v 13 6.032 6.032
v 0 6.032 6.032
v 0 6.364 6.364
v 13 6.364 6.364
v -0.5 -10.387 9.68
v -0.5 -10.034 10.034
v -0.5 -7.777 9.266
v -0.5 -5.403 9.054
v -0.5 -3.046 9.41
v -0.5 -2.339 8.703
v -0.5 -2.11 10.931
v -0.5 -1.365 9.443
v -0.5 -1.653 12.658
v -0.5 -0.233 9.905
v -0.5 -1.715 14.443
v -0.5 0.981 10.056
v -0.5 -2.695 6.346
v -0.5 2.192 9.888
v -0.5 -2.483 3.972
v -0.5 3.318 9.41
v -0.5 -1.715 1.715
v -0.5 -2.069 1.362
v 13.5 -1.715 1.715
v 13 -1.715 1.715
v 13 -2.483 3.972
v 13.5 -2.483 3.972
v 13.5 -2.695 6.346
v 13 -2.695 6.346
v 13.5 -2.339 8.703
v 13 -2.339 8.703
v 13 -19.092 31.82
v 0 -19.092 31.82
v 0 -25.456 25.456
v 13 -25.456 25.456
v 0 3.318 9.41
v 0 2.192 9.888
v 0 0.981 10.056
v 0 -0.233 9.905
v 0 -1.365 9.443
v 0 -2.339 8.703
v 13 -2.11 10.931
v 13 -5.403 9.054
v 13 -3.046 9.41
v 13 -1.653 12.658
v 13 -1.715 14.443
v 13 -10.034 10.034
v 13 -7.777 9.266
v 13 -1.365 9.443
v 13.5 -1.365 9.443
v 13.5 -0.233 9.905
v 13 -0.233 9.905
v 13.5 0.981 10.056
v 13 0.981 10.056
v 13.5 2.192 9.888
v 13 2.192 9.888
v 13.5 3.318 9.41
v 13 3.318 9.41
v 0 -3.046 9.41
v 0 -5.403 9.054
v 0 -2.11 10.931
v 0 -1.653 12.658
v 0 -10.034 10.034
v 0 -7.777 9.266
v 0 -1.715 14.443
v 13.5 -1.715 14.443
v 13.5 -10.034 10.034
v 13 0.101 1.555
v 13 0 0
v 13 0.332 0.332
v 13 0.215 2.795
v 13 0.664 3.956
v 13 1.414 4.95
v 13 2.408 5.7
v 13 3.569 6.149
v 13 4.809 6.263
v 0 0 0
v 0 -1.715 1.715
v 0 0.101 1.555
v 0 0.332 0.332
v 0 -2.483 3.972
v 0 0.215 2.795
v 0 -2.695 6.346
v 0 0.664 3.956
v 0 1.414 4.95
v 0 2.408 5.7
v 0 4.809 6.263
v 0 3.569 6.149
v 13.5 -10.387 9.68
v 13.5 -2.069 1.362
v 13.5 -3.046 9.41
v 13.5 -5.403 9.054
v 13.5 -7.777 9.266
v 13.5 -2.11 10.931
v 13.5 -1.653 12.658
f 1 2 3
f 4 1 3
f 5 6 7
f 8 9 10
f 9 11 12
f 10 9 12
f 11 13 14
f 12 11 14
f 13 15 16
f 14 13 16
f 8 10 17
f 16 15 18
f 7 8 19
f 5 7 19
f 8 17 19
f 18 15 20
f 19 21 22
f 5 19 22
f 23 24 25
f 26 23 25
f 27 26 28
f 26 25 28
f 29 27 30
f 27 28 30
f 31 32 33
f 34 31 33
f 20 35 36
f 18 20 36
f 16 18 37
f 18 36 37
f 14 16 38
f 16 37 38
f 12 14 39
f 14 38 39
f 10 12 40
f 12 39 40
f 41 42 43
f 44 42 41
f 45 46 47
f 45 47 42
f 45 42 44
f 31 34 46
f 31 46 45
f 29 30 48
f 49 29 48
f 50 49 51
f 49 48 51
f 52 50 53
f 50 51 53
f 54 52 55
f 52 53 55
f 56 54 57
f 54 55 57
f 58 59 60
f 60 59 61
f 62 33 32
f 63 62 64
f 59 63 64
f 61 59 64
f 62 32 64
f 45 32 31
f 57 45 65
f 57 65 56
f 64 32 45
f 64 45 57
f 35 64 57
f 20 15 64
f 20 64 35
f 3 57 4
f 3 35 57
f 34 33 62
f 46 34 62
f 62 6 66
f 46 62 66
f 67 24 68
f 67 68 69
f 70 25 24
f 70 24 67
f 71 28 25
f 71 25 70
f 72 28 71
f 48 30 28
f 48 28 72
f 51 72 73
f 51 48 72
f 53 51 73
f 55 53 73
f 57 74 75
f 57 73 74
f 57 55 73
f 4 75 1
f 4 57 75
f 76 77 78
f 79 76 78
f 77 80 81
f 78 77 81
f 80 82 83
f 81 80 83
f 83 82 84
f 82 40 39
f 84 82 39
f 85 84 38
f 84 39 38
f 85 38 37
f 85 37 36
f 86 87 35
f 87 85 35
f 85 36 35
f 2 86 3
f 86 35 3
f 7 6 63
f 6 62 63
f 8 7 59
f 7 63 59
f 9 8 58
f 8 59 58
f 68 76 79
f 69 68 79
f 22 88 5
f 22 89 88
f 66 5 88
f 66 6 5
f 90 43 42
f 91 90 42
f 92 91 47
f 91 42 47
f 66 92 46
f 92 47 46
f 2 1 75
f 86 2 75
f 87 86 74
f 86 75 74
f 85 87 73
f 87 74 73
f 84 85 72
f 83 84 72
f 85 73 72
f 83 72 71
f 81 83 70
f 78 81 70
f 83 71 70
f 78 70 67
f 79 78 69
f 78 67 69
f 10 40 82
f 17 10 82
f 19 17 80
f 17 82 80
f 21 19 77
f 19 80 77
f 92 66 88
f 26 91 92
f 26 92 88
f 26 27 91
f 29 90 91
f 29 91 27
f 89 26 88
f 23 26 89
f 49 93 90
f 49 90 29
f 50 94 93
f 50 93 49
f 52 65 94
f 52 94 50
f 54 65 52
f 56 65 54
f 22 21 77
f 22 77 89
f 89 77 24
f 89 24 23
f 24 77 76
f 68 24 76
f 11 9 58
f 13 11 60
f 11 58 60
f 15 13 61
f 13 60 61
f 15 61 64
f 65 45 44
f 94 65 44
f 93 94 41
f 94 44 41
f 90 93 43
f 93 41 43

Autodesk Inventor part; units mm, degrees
ref_plane "YZ Plane" through (0, 0, 0) normal (1, 0, 0) x (0, 1, 0)
ref_plane "XZ Plane" through (0, 0, 0) normal (0, 1, 0) x (-1, 0, 0)
ref_plane "XY Plane" through (0, 0, 0) normal (0, 0, 1) x (1, 0, 0)
sketch "Sketch1" plane through (0, 0, 0) normal (1, 0, 0) x (0, 1, 0)
  line L0 (0, 0) -> (6.364, 6.364)
  line L1 (0, 0) -> (10.533, 0) construction
  line L2 (0, 0) -> (36, 0) construction
  line L3 (-19.0919, 31.8198) -> (-25.4558, 25.4558)
  line L4 (-19.0919, 31.8198) -> (6.364, 6.364)
  line L5 (-25.4558, 25.4558) -> (0, 0)
  dimension "d0" = 9
  dimension "d1" = 45
  dimension "d2" = 36
  dimension "d15" = 9
extrude "Extrusion4" add sketch "Sketch1" along normal blind 13
sketch "Sketch4" plane through (13, 0, 0) normal (1, 0, 0) x (0, 0, -1)
  line L0 (0, 0) -> (-6.364, 6.364) projected
  line L1 (-3.182, 3.182) -> (-1.7678, 1.7678)
  line L2 (-3.182, 3.182) -> (-1.7678, 4.5962)
  circle A0 centre (-1.7678, 4.5962) radius 4.5
  point P0 (-6.0324, 6.0324)
  point P1 (-0.3315, 0.3315)
  dimension "d18" = 2
  dimension "d19" = 2
  dimension "d20" = 9
extrude "Extrusion5" cut sketch "Sketch4" against normal blind 13 contours L0 A0 picked at (-2.8444, 1.8095)
sketch "Sketch8" plane through (13, 0, 0) normal (0, -0.7071, -0.7071) x (-1, 0, 0)
  line L0 (0, -36) -> (0, 0) projected
  line L1 (0, -1.9255) -> (0, -2.4255)
  line L2 (0, -2.4255) -> (-0.5, -2.4255)
  line L3 (13, -36) -> (13, 0) projected
  line L4 (13, -13.6899) -> (13, -14.1899)
  line L5 (13, -14.1899) -> (13.5, -14.1899)
  line L6 (13.5, -14.1899) -> (-0.5, -14.1899)
  line L7 (-0.5, -14.1899) -> (-0.5, -2.4255)
  line L8 (-0.5, -2.4255) -> (13.5, -2.4255)
  line L9 (13.5, -2.4255) -> (13.5, -14.1899)
  dimension "d31" = 0.5
  dimension "d32" = 0.5
  dimension "d33" = 0.5
  dimension "d34" = 0.5
extrude "Extrusion7" add sketch "Sketch8" along normal blind 0.5
sketch "Sketch9" plane through (13, 0, 0) normal (1, 0, 0) x (0, 0, -1)
  line L0 (-1.7151, -1.7151) -> (-10.0338, -10.0338) projected
  line L1 (-5.8744, -5.8744) -> (-12.2384, 0.4895)
  line L2 (-6.364, 6.364) -> (-31.8198, -19.0919) projected
  line L3 (-9.0564, -2.6925) -> (-8.7029, -2.3389)
  line L4 (-9.0564, -2.6925) -> (-9.41, -3.046)
  line L5 (-1.7151, -1.7151) -> (0, 0) projected
  arc A0 (-8.7029, -2.3389) -> (-1.7151, -1.7151) centre (-6.0417, 7.3005) ccw
  arc A1 (-10.0338, -10.0338) -> (-9.41, -3.046) centre (-19.0494, -5.7072) ccw
  arc A2 (-9.41, -3.046) -> (-14.443, -1.7151) centre (-13.3407, -7.7285) ccw
  arc A3 (-9.41, 3.3179) -> (-8.7029, -2.3389) centre (-5.3886, 0.948) ccw
  dimension "d37" = 0.5
  dimension "d38" = 0.5
  dimension "d39" = 10
  dimension "d40" = 10
extrude "Extrusion8" add sketch "Sketch9" along normal blind 0.5 and the other way blind 13.5
sketch "Sketch10" plane through (13, -25.4558, 25.4558) normal (0, -0.7071, -0.7071) x (-1, 0, 0)
  line L0 (-0.836, 22.8138) -> (15.9237, 22.8138) construction
  line L1 (15.9237, 22.8138) -> (15.9237, -0.8905) construction
  line L2 (15.9237, -0.8905) -> (-0.836, -0.8905) construction
  line L3 (-0.836, -0.8905) -> (-0.836, 22.8138) construction
  point P0 (13, 36)
decal "Decal1"
properties part number "McCrea_paza_Walle"
